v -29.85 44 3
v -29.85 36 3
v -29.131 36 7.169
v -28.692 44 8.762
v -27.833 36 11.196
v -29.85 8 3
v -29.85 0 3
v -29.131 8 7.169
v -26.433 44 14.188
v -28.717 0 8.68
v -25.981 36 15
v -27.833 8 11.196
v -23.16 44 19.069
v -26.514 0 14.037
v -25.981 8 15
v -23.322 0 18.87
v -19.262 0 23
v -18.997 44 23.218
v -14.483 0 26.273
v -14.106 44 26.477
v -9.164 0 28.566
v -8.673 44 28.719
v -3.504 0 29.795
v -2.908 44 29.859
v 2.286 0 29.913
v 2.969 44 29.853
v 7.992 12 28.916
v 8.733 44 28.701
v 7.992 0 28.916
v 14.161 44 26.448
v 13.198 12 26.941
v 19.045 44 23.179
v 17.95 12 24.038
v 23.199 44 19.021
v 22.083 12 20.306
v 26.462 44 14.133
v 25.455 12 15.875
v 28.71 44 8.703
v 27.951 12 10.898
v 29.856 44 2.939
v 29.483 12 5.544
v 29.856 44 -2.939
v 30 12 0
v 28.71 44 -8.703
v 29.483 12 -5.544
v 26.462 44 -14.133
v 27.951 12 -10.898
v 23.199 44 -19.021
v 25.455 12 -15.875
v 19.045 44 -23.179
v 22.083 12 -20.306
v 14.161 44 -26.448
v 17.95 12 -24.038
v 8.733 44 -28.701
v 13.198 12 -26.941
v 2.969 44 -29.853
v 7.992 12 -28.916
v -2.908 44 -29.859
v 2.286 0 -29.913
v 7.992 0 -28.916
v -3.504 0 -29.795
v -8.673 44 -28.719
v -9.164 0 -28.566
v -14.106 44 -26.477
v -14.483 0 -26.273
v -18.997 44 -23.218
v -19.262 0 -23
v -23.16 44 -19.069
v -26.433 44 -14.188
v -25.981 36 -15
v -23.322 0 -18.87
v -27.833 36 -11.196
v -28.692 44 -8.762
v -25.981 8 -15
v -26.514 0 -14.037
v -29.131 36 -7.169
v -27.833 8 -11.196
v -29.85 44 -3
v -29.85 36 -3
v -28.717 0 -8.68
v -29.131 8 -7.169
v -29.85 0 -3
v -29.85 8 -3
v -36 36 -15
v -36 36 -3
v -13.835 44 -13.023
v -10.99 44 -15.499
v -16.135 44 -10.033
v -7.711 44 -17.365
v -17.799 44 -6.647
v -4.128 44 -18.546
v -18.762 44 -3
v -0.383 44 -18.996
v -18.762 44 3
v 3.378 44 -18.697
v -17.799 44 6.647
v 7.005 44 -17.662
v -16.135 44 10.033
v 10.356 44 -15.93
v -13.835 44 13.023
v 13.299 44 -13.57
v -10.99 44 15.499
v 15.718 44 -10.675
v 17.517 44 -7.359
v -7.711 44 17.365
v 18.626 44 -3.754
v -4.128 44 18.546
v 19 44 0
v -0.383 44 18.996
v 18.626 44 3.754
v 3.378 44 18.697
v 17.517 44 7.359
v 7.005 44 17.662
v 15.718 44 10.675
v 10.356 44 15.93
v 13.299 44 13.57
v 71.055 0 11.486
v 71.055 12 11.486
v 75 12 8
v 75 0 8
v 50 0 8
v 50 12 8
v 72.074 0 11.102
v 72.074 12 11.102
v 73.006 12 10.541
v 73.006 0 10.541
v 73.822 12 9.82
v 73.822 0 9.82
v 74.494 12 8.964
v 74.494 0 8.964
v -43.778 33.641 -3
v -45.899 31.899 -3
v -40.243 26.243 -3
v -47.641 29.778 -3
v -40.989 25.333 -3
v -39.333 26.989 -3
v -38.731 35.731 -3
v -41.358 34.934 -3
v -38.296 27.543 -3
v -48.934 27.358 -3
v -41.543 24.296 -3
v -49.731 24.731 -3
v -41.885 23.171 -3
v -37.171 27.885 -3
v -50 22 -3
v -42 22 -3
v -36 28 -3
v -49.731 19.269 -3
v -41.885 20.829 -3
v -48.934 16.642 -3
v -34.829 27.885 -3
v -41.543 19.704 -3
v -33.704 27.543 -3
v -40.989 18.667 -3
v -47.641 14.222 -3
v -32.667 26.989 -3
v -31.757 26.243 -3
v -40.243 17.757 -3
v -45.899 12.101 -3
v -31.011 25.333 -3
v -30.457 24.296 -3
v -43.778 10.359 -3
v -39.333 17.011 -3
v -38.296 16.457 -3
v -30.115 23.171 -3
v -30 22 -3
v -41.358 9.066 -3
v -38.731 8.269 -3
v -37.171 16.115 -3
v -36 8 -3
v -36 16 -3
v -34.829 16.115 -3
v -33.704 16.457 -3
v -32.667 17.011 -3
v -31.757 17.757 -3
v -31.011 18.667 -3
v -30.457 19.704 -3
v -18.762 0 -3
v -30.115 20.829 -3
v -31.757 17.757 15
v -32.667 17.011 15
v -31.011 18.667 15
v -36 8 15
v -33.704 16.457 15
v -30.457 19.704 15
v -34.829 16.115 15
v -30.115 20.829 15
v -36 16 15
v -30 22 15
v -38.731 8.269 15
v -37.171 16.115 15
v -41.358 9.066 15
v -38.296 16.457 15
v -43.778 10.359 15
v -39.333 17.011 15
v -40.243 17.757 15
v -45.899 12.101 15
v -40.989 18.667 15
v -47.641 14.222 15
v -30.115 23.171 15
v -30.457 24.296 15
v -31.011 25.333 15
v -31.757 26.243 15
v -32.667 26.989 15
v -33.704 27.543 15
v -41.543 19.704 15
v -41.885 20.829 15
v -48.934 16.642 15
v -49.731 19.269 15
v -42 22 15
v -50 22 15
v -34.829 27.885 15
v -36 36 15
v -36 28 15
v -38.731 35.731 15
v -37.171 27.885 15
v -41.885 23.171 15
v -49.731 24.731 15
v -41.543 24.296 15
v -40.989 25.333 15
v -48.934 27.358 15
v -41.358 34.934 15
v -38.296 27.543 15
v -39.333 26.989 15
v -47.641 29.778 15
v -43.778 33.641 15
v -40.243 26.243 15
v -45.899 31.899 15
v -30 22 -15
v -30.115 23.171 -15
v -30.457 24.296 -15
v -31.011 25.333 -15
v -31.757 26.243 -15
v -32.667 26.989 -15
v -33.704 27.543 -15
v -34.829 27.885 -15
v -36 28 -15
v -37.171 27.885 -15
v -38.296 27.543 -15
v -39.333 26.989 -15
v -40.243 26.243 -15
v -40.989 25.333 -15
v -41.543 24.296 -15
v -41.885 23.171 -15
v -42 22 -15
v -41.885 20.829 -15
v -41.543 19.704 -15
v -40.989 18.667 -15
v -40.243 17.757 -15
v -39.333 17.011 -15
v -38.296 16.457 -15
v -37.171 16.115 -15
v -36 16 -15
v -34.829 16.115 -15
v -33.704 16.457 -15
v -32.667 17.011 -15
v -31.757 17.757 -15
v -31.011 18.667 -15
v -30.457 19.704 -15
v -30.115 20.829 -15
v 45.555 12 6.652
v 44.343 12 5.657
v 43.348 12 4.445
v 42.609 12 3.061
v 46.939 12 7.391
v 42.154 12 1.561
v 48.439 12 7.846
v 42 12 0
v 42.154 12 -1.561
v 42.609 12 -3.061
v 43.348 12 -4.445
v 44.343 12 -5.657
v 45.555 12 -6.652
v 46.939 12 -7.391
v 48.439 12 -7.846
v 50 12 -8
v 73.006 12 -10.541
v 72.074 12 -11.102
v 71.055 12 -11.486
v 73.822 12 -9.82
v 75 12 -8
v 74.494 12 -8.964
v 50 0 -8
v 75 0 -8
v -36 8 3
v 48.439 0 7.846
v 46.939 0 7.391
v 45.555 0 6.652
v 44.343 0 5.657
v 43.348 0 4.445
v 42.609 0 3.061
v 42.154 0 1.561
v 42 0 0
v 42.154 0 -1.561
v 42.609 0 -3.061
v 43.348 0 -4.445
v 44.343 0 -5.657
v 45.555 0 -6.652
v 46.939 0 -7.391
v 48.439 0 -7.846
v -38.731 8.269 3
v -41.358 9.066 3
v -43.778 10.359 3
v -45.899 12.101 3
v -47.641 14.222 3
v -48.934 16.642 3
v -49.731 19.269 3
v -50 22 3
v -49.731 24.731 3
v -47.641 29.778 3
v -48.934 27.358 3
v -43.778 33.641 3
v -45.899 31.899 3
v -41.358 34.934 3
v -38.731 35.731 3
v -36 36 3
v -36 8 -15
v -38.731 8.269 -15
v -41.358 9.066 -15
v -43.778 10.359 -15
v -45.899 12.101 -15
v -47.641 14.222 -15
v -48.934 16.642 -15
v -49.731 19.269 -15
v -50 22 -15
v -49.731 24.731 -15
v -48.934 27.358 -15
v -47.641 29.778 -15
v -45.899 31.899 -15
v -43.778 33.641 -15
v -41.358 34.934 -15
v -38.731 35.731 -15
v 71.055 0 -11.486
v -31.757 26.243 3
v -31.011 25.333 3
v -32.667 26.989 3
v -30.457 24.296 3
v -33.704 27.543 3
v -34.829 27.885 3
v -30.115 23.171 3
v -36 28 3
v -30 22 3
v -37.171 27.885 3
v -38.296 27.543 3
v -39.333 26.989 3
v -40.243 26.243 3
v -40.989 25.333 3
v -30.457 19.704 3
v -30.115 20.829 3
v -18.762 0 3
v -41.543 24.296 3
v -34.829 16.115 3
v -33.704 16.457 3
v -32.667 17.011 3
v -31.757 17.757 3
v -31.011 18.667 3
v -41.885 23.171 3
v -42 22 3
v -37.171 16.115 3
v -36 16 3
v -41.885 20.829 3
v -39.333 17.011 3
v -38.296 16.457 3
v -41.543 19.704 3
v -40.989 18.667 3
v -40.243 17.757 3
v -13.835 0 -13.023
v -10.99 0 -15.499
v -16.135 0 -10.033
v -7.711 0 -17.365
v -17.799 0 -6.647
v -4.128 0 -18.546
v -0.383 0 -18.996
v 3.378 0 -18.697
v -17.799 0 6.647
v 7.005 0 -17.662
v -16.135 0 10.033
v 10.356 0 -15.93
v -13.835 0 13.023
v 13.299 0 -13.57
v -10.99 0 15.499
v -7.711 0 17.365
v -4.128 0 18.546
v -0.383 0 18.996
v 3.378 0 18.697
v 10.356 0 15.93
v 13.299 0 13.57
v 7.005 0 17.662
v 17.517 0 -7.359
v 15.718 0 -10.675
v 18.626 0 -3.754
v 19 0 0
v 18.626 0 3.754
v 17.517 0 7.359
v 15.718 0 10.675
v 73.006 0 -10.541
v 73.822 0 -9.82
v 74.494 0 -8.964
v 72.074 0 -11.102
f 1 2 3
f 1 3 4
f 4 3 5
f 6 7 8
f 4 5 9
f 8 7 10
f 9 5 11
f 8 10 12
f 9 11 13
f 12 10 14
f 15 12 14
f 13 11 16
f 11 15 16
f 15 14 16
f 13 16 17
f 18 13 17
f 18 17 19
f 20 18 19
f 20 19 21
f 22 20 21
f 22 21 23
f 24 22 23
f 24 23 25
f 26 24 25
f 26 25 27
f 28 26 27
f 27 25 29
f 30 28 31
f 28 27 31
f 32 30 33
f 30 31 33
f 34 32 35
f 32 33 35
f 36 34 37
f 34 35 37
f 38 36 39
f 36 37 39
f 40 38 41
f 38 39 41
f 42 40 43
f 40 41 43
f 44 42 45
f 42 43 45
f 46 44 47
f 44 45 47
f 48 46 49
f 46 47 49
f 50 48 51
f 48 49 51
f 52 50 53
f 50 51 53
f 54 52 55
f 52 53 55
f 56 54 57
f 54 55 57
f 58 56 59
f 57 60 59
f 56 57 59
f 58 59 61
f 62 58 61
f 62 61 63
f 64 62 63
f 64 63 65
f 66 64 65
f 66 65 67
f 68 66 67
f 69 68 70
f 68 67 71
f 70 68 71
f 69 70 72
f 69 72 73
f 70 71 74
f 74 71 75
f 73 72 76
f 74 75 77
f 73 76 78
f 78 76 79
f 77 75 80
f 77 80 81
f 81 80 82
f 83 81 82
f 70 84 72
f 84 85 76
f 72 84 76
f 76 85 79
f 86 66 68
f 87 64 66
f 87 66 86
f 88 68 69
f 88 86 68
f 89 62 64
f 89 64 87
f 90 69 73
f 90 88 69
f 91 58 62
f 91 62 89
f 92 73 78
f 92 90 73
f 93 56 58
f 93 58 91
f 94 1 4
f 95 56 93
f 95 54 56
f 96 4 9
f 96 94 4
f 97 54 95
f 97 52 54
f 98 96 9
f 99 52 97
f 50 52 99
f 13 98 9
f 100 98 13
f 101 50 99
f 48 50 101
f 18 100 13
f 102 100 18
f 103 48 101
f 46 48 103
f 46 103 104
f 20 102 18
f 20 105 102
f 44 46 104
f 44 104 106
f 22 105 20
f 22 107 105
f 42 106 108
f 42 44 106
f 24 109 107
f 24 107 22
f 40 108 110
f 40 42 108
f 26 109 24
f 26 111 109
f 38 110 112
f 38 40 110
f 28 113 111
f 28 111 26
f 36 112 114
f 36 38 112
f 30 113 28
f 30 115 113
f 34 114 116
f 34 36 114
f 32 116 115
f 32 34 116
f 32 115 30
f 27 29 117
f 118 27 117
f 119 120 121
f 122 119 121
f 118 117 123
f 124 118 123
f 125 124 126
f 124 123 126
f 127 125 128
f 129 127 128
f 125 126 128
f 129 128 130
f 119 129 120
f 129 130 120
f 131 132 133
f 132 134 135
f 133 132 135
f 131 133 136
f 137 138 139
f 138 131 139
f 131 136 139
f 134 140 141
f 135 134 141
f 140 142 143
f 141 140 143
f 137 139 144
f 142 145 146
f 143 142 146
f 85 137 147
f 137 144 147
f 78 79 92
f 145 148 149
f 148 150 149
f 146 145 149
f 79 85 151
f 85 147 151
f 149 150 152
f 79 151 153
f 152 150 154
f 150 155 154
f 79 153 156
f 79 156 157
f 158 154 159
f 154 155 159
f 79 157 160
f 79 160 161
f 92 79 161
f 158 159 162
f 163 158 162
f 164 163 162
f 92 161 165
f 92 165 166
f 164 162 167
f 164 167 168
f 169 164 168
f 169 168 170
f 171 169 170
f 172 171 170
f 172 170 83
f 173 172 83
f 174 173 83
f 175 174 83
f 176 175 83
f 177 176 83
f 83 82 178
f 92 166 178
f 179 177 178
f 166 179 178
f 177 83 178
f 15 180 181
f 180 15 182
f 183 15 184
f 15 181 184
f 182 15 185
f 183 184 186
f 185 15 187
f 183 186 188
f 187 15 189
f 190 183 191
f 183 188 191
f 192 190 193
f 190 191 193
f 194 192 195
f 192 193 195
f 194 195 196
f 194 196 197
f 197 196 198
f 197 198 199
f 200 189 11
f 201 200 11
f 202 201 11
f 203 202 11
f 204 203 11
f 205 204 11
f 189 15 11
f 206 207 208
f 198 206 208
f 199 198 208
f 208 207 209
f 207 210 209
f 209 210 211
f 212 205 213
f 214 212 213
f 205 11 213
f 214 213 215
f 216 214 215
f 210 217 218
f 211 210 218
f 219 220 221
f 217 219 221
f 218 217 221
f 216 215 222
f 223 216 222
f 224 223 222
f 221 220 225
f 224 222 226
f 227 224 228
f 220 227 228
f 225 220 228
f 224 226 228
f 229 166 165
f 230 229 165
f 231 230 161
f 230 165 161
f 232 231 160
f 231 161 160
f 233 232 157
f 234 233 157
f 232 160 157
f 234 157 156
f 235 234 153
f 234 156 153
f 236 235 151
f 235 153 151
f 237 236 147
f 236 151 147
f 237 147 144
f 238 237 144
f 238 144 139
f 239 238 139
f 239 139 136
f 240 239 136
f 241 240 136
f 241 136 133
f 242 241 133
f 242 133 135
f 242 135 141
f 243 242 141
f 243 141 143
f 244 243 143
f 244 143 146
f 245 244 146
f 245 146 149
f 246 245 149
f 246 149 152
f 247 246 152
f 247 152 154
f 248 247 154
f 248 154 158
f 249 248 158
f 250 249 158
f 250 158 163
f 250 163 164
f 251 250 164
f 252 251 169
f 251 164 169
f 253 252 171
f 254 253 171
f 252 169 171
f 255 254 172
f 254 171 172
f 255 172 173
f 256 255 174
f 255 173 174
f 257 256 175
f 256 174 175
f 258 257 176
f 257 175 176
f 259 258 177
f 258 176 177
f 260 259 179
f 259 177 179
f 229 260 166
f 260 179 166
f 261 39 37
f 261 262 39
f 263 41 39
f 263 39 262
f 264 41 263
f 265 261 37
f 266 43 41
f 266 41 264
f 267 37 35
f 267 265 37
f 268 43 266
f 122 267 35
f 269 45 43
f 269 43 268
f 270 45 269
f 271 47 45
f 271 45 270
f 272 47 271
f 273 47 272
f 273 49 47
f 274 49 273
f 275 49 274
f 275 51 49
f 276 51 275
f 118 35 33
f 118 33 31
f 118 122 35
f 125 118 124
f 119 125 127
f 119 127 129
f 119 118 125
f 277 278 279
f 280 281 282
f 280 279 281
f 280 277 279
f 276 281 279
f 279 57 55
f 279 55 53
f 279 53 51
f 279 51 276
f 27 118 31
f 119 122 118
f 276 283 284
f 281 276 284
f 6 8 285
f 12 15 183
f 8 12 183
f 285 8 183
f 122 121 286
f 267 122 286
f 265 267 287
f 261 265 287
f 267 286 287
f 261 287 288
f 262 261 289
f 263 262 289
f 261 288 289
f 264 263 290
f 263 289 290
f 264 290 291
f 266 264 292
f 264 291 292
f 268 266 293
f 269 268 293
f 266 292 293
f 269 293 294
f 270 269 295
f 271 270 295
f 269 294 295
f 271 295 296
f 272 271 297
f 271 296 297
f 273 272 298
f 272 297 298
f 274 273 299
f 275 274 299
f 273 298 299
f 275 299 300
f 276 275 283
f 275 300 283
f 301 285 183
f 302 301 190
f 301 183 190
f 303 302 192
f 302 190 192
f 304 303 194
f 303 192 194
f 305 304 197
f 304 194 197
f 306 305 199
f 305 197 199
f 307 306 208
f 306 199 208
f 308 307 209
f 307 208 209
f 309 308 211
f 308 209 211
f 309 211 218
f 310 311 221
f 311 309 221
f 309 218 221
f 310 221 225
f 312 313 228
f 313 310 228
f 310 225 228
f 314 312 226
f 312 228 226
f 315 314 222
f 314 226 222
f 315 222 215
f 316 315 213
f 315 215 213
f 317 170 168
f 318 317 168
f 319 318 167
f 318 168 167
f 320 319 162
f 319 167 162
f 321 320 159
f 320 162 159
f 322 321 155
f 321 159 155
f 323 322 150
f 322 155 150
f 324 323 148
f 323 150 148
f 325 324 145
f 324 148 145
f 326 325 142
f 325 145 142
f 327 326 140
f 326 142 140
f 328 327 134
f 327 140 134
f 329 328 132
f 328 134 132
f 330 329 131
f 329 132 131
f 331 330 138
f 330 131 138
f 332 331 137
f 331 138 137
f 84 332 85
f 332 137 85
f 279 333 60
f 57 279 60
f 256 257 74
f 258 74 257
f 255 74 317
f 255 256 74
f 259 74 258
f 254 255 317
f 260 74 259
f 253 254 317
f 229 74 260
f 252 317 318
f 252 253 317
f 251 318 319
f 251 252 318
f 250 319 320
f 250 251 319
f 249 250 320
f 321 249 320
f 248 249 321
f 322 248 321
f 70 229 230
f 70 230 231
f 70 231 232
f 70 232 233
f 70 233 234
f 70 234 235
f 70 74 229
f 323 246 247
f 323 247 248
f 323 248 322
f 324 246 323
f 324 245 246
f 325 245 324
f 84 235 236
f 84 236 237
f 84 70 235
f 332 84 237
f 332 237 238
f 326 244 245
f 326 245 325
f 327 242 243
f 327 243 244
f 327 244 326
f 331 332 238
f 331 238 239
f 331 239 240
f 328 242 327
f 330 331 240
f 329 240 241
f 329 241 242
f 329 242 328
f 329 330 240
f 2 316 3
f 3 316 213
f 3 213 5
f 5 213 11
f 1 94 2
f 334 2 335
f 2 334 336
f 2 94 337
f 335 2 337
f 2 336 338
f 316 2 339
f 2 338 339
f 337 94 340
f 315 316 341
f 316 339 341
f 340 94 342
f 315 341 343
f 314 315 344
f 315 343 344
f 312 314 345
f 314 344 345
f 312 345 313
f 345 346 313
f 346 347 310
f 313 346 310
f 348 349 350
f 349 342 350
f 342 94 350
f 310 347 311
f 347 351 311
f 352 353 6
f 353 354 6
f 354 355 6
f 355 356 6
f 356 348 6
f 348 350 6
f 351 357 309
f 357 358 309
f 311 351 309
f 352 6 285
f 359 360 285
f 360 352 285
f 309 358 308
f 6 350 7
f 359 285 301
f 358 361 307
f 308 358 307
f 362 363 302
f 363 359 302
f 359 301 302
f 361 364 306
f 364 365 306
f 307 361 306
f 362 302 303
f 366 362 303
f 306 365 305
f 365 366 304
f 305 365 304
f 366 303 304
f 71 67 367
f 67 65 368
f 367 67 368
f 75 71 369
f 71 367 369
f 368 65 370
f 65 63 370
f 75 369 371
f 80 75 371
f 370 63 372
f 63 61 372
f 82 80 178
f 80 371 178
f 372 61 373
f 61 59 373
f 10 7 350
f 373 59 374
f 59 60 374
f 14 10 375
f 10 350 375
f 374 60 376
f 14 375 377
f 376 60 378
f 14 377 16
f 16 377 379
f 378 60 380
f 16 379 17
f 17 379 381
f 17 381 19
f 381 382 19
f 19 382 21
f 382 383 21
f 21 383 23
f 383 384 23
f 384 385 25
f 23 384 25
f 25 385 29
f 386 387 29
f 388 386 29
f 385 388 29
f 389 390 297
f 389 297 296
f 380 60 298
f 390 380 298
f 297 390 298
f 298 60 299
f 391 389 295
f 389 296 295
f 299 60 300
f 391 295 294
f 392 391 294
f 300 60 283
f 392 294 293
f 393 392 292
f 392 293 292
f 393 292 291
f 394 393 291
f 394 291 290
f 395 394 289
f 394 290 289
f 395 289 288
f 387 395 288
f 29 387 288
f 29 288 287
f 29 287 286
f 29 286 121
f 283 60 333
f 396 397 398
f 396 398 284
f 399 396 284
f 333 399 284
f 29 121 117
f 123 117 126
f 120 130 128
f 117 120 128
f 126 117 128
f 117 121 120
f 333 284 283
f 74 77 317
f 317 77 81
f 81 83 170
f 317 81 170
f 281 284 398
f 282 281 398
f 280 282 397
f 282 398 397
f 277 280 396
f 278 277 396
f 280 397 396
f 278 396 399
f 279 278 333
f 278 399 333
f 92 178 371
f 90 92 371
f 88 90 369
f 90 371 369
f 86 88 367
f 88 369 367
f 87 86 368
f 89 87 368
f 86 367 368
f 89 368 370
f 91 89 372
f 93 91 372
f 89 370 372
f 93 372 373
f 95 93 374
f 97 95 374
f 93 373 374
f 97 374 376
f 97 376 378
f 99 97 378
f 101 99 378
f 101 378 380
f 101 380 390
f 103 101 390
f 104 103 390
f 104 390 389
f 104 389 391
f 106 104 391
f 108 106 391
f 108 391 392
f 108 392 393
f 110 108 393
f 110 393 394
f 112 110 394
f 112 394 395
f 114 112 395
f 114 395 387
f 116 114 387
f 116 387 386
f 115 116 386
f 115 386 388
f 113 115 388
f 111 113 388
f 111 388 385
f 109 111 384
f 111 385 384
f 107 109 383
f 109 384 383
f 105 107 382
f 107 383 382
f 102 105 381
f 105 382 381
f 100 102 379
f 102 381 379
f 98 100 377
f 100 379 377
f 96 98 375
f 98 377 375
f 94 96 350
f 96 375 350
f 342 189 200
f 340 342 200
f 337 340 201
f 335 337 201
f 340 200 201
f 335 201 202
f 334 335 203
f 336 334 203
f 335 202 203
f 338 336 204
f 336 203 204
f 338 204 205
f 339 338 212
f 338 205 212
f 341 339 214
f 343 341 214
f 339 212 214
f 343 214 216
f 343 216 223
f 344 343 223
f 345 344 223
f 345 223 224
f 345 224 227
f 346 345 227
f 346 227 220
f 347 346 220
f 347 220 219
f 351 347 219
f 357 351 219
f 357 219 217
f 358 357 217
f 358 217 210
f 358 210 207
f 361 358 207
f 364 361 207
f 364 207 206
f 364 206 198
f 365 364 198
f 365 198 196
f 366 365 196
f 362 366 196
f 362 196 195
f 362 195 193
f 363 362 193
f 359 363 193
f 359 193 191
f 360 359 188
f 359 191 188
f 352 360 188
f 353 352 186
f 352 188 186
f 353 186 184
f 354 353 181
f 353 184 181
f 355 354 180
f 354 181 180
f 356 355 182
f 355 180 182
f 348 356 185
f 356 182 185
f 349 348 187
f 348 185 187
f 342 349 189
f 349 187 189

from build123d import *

# Parameters (mm, degrees)
SKETCH1_R           = 30
BOSS_EXTRUDE1_DEPTH = 44
BOSS_EXTRUDE2_DEPTH = 12
BOSS_EXTRUDE3_DEPTH = 15
CUT_EXTRUDE1_DEPTH  = 92.983694207
SKETCH5_R           = 6
CUT_EXTRUDE2_DEPTH  = 98.908120194


with BuildPart() as part:
    # Sketch1 → Boss-Extrude1 (new body)
    with BuildSketch(Plane(origin=(0, 0, 0), x_dir=(1, 0, 0), z_dir=(0, 1, 0))):
        with Locations(Location((0, 0, 0), (0, 0, 270))):
            Circle(SKETCH1_R)
    extrude(amount=BOSS_EXTRUDE1_DEPTH)

    # Sketch2 → Boss-Extrude2 (add)
    with BuildSketch(Plane(origin=(0, 0, 0), x_dir=(1, 0, 0), z_dir=(0, 1, 0))):
        with BuildLine():
            Line((50, 8), (75, 8))
            ThreePointArc((75, 8), (73.430488051, 10.198766547), (71.055490967, 11.486140207))
            Line((71.055490967, 11.486140207), (7.99189246, 28.915906607))
            ThreePointArc((7.99189246, 28.915906607), (30, 0), (7.99189246, -28.915906607))
            Line((7.99189246, -28.915906607), (71.055490967, -11.486140207))
            ThreePointArc((71.055490967, -11.486140207), (73.430488051, -10.198766547), (75, -8))
            Line((75, -8), (50, -8))
            ThreePointArc((50, -8), (42, 0), (50, 8))
        make_face()
    extrude(amount=BOSS_EXTRUDE2_DEPTH)

    # Sketch3 → Boss-Extrude3 (add, symmetric)
    with BuildSketch(Plane.XY):
        with BuildLine():
            Line((-36, 36), (-23.901481141, 36))
            Line((-23.901481141, 36), (-23.901481141, 8))
            Line((-23.901481141, 8), (-36, 8))
            ThreePointArc((-36, 8), (-50, 22), (-36, 36))
        make_face()
    extrude(amount=BOSS_EXTRUDE3_DEPTH, both=True)

    # Sketch4 → Cut-Extrude1 (cut, through all)
    with BuildSketch(Plane(origin=(0, 0, 0), x_dir=(1, 0, 0), z_dir=(0, 1, 0))):
        with BuildLine():
            Line((-72.566045066, 0), (-72.566045066, 3))
            Line((-72.566045066, 3), (-18.761663039, 3))
            ThreePointArc((-18.761663039, 3), (19, 0), (-18.761663039, -3))
            Line((-18.761663039, -3), (-72.566045066, -3))
            Line((-72.566045066, -3), (-72.566045066, 0))
        make_face()
    extrude(amount=CUT_EXTRUDE1_DEPTH, mode=Mode.SUBTRACT)

    # Sketch5 → Cut-Extrude2 (cut, through all)
    with BuildSketch(Plane.XY.offset(15)):
        with Locations((-36, 22)):
            Circle(SKETCH5_R)
    extrude(amount=-CUT_EXTRUDE2_DEPTH, mode=Mode.SUBTRACT)


solid = part.part
